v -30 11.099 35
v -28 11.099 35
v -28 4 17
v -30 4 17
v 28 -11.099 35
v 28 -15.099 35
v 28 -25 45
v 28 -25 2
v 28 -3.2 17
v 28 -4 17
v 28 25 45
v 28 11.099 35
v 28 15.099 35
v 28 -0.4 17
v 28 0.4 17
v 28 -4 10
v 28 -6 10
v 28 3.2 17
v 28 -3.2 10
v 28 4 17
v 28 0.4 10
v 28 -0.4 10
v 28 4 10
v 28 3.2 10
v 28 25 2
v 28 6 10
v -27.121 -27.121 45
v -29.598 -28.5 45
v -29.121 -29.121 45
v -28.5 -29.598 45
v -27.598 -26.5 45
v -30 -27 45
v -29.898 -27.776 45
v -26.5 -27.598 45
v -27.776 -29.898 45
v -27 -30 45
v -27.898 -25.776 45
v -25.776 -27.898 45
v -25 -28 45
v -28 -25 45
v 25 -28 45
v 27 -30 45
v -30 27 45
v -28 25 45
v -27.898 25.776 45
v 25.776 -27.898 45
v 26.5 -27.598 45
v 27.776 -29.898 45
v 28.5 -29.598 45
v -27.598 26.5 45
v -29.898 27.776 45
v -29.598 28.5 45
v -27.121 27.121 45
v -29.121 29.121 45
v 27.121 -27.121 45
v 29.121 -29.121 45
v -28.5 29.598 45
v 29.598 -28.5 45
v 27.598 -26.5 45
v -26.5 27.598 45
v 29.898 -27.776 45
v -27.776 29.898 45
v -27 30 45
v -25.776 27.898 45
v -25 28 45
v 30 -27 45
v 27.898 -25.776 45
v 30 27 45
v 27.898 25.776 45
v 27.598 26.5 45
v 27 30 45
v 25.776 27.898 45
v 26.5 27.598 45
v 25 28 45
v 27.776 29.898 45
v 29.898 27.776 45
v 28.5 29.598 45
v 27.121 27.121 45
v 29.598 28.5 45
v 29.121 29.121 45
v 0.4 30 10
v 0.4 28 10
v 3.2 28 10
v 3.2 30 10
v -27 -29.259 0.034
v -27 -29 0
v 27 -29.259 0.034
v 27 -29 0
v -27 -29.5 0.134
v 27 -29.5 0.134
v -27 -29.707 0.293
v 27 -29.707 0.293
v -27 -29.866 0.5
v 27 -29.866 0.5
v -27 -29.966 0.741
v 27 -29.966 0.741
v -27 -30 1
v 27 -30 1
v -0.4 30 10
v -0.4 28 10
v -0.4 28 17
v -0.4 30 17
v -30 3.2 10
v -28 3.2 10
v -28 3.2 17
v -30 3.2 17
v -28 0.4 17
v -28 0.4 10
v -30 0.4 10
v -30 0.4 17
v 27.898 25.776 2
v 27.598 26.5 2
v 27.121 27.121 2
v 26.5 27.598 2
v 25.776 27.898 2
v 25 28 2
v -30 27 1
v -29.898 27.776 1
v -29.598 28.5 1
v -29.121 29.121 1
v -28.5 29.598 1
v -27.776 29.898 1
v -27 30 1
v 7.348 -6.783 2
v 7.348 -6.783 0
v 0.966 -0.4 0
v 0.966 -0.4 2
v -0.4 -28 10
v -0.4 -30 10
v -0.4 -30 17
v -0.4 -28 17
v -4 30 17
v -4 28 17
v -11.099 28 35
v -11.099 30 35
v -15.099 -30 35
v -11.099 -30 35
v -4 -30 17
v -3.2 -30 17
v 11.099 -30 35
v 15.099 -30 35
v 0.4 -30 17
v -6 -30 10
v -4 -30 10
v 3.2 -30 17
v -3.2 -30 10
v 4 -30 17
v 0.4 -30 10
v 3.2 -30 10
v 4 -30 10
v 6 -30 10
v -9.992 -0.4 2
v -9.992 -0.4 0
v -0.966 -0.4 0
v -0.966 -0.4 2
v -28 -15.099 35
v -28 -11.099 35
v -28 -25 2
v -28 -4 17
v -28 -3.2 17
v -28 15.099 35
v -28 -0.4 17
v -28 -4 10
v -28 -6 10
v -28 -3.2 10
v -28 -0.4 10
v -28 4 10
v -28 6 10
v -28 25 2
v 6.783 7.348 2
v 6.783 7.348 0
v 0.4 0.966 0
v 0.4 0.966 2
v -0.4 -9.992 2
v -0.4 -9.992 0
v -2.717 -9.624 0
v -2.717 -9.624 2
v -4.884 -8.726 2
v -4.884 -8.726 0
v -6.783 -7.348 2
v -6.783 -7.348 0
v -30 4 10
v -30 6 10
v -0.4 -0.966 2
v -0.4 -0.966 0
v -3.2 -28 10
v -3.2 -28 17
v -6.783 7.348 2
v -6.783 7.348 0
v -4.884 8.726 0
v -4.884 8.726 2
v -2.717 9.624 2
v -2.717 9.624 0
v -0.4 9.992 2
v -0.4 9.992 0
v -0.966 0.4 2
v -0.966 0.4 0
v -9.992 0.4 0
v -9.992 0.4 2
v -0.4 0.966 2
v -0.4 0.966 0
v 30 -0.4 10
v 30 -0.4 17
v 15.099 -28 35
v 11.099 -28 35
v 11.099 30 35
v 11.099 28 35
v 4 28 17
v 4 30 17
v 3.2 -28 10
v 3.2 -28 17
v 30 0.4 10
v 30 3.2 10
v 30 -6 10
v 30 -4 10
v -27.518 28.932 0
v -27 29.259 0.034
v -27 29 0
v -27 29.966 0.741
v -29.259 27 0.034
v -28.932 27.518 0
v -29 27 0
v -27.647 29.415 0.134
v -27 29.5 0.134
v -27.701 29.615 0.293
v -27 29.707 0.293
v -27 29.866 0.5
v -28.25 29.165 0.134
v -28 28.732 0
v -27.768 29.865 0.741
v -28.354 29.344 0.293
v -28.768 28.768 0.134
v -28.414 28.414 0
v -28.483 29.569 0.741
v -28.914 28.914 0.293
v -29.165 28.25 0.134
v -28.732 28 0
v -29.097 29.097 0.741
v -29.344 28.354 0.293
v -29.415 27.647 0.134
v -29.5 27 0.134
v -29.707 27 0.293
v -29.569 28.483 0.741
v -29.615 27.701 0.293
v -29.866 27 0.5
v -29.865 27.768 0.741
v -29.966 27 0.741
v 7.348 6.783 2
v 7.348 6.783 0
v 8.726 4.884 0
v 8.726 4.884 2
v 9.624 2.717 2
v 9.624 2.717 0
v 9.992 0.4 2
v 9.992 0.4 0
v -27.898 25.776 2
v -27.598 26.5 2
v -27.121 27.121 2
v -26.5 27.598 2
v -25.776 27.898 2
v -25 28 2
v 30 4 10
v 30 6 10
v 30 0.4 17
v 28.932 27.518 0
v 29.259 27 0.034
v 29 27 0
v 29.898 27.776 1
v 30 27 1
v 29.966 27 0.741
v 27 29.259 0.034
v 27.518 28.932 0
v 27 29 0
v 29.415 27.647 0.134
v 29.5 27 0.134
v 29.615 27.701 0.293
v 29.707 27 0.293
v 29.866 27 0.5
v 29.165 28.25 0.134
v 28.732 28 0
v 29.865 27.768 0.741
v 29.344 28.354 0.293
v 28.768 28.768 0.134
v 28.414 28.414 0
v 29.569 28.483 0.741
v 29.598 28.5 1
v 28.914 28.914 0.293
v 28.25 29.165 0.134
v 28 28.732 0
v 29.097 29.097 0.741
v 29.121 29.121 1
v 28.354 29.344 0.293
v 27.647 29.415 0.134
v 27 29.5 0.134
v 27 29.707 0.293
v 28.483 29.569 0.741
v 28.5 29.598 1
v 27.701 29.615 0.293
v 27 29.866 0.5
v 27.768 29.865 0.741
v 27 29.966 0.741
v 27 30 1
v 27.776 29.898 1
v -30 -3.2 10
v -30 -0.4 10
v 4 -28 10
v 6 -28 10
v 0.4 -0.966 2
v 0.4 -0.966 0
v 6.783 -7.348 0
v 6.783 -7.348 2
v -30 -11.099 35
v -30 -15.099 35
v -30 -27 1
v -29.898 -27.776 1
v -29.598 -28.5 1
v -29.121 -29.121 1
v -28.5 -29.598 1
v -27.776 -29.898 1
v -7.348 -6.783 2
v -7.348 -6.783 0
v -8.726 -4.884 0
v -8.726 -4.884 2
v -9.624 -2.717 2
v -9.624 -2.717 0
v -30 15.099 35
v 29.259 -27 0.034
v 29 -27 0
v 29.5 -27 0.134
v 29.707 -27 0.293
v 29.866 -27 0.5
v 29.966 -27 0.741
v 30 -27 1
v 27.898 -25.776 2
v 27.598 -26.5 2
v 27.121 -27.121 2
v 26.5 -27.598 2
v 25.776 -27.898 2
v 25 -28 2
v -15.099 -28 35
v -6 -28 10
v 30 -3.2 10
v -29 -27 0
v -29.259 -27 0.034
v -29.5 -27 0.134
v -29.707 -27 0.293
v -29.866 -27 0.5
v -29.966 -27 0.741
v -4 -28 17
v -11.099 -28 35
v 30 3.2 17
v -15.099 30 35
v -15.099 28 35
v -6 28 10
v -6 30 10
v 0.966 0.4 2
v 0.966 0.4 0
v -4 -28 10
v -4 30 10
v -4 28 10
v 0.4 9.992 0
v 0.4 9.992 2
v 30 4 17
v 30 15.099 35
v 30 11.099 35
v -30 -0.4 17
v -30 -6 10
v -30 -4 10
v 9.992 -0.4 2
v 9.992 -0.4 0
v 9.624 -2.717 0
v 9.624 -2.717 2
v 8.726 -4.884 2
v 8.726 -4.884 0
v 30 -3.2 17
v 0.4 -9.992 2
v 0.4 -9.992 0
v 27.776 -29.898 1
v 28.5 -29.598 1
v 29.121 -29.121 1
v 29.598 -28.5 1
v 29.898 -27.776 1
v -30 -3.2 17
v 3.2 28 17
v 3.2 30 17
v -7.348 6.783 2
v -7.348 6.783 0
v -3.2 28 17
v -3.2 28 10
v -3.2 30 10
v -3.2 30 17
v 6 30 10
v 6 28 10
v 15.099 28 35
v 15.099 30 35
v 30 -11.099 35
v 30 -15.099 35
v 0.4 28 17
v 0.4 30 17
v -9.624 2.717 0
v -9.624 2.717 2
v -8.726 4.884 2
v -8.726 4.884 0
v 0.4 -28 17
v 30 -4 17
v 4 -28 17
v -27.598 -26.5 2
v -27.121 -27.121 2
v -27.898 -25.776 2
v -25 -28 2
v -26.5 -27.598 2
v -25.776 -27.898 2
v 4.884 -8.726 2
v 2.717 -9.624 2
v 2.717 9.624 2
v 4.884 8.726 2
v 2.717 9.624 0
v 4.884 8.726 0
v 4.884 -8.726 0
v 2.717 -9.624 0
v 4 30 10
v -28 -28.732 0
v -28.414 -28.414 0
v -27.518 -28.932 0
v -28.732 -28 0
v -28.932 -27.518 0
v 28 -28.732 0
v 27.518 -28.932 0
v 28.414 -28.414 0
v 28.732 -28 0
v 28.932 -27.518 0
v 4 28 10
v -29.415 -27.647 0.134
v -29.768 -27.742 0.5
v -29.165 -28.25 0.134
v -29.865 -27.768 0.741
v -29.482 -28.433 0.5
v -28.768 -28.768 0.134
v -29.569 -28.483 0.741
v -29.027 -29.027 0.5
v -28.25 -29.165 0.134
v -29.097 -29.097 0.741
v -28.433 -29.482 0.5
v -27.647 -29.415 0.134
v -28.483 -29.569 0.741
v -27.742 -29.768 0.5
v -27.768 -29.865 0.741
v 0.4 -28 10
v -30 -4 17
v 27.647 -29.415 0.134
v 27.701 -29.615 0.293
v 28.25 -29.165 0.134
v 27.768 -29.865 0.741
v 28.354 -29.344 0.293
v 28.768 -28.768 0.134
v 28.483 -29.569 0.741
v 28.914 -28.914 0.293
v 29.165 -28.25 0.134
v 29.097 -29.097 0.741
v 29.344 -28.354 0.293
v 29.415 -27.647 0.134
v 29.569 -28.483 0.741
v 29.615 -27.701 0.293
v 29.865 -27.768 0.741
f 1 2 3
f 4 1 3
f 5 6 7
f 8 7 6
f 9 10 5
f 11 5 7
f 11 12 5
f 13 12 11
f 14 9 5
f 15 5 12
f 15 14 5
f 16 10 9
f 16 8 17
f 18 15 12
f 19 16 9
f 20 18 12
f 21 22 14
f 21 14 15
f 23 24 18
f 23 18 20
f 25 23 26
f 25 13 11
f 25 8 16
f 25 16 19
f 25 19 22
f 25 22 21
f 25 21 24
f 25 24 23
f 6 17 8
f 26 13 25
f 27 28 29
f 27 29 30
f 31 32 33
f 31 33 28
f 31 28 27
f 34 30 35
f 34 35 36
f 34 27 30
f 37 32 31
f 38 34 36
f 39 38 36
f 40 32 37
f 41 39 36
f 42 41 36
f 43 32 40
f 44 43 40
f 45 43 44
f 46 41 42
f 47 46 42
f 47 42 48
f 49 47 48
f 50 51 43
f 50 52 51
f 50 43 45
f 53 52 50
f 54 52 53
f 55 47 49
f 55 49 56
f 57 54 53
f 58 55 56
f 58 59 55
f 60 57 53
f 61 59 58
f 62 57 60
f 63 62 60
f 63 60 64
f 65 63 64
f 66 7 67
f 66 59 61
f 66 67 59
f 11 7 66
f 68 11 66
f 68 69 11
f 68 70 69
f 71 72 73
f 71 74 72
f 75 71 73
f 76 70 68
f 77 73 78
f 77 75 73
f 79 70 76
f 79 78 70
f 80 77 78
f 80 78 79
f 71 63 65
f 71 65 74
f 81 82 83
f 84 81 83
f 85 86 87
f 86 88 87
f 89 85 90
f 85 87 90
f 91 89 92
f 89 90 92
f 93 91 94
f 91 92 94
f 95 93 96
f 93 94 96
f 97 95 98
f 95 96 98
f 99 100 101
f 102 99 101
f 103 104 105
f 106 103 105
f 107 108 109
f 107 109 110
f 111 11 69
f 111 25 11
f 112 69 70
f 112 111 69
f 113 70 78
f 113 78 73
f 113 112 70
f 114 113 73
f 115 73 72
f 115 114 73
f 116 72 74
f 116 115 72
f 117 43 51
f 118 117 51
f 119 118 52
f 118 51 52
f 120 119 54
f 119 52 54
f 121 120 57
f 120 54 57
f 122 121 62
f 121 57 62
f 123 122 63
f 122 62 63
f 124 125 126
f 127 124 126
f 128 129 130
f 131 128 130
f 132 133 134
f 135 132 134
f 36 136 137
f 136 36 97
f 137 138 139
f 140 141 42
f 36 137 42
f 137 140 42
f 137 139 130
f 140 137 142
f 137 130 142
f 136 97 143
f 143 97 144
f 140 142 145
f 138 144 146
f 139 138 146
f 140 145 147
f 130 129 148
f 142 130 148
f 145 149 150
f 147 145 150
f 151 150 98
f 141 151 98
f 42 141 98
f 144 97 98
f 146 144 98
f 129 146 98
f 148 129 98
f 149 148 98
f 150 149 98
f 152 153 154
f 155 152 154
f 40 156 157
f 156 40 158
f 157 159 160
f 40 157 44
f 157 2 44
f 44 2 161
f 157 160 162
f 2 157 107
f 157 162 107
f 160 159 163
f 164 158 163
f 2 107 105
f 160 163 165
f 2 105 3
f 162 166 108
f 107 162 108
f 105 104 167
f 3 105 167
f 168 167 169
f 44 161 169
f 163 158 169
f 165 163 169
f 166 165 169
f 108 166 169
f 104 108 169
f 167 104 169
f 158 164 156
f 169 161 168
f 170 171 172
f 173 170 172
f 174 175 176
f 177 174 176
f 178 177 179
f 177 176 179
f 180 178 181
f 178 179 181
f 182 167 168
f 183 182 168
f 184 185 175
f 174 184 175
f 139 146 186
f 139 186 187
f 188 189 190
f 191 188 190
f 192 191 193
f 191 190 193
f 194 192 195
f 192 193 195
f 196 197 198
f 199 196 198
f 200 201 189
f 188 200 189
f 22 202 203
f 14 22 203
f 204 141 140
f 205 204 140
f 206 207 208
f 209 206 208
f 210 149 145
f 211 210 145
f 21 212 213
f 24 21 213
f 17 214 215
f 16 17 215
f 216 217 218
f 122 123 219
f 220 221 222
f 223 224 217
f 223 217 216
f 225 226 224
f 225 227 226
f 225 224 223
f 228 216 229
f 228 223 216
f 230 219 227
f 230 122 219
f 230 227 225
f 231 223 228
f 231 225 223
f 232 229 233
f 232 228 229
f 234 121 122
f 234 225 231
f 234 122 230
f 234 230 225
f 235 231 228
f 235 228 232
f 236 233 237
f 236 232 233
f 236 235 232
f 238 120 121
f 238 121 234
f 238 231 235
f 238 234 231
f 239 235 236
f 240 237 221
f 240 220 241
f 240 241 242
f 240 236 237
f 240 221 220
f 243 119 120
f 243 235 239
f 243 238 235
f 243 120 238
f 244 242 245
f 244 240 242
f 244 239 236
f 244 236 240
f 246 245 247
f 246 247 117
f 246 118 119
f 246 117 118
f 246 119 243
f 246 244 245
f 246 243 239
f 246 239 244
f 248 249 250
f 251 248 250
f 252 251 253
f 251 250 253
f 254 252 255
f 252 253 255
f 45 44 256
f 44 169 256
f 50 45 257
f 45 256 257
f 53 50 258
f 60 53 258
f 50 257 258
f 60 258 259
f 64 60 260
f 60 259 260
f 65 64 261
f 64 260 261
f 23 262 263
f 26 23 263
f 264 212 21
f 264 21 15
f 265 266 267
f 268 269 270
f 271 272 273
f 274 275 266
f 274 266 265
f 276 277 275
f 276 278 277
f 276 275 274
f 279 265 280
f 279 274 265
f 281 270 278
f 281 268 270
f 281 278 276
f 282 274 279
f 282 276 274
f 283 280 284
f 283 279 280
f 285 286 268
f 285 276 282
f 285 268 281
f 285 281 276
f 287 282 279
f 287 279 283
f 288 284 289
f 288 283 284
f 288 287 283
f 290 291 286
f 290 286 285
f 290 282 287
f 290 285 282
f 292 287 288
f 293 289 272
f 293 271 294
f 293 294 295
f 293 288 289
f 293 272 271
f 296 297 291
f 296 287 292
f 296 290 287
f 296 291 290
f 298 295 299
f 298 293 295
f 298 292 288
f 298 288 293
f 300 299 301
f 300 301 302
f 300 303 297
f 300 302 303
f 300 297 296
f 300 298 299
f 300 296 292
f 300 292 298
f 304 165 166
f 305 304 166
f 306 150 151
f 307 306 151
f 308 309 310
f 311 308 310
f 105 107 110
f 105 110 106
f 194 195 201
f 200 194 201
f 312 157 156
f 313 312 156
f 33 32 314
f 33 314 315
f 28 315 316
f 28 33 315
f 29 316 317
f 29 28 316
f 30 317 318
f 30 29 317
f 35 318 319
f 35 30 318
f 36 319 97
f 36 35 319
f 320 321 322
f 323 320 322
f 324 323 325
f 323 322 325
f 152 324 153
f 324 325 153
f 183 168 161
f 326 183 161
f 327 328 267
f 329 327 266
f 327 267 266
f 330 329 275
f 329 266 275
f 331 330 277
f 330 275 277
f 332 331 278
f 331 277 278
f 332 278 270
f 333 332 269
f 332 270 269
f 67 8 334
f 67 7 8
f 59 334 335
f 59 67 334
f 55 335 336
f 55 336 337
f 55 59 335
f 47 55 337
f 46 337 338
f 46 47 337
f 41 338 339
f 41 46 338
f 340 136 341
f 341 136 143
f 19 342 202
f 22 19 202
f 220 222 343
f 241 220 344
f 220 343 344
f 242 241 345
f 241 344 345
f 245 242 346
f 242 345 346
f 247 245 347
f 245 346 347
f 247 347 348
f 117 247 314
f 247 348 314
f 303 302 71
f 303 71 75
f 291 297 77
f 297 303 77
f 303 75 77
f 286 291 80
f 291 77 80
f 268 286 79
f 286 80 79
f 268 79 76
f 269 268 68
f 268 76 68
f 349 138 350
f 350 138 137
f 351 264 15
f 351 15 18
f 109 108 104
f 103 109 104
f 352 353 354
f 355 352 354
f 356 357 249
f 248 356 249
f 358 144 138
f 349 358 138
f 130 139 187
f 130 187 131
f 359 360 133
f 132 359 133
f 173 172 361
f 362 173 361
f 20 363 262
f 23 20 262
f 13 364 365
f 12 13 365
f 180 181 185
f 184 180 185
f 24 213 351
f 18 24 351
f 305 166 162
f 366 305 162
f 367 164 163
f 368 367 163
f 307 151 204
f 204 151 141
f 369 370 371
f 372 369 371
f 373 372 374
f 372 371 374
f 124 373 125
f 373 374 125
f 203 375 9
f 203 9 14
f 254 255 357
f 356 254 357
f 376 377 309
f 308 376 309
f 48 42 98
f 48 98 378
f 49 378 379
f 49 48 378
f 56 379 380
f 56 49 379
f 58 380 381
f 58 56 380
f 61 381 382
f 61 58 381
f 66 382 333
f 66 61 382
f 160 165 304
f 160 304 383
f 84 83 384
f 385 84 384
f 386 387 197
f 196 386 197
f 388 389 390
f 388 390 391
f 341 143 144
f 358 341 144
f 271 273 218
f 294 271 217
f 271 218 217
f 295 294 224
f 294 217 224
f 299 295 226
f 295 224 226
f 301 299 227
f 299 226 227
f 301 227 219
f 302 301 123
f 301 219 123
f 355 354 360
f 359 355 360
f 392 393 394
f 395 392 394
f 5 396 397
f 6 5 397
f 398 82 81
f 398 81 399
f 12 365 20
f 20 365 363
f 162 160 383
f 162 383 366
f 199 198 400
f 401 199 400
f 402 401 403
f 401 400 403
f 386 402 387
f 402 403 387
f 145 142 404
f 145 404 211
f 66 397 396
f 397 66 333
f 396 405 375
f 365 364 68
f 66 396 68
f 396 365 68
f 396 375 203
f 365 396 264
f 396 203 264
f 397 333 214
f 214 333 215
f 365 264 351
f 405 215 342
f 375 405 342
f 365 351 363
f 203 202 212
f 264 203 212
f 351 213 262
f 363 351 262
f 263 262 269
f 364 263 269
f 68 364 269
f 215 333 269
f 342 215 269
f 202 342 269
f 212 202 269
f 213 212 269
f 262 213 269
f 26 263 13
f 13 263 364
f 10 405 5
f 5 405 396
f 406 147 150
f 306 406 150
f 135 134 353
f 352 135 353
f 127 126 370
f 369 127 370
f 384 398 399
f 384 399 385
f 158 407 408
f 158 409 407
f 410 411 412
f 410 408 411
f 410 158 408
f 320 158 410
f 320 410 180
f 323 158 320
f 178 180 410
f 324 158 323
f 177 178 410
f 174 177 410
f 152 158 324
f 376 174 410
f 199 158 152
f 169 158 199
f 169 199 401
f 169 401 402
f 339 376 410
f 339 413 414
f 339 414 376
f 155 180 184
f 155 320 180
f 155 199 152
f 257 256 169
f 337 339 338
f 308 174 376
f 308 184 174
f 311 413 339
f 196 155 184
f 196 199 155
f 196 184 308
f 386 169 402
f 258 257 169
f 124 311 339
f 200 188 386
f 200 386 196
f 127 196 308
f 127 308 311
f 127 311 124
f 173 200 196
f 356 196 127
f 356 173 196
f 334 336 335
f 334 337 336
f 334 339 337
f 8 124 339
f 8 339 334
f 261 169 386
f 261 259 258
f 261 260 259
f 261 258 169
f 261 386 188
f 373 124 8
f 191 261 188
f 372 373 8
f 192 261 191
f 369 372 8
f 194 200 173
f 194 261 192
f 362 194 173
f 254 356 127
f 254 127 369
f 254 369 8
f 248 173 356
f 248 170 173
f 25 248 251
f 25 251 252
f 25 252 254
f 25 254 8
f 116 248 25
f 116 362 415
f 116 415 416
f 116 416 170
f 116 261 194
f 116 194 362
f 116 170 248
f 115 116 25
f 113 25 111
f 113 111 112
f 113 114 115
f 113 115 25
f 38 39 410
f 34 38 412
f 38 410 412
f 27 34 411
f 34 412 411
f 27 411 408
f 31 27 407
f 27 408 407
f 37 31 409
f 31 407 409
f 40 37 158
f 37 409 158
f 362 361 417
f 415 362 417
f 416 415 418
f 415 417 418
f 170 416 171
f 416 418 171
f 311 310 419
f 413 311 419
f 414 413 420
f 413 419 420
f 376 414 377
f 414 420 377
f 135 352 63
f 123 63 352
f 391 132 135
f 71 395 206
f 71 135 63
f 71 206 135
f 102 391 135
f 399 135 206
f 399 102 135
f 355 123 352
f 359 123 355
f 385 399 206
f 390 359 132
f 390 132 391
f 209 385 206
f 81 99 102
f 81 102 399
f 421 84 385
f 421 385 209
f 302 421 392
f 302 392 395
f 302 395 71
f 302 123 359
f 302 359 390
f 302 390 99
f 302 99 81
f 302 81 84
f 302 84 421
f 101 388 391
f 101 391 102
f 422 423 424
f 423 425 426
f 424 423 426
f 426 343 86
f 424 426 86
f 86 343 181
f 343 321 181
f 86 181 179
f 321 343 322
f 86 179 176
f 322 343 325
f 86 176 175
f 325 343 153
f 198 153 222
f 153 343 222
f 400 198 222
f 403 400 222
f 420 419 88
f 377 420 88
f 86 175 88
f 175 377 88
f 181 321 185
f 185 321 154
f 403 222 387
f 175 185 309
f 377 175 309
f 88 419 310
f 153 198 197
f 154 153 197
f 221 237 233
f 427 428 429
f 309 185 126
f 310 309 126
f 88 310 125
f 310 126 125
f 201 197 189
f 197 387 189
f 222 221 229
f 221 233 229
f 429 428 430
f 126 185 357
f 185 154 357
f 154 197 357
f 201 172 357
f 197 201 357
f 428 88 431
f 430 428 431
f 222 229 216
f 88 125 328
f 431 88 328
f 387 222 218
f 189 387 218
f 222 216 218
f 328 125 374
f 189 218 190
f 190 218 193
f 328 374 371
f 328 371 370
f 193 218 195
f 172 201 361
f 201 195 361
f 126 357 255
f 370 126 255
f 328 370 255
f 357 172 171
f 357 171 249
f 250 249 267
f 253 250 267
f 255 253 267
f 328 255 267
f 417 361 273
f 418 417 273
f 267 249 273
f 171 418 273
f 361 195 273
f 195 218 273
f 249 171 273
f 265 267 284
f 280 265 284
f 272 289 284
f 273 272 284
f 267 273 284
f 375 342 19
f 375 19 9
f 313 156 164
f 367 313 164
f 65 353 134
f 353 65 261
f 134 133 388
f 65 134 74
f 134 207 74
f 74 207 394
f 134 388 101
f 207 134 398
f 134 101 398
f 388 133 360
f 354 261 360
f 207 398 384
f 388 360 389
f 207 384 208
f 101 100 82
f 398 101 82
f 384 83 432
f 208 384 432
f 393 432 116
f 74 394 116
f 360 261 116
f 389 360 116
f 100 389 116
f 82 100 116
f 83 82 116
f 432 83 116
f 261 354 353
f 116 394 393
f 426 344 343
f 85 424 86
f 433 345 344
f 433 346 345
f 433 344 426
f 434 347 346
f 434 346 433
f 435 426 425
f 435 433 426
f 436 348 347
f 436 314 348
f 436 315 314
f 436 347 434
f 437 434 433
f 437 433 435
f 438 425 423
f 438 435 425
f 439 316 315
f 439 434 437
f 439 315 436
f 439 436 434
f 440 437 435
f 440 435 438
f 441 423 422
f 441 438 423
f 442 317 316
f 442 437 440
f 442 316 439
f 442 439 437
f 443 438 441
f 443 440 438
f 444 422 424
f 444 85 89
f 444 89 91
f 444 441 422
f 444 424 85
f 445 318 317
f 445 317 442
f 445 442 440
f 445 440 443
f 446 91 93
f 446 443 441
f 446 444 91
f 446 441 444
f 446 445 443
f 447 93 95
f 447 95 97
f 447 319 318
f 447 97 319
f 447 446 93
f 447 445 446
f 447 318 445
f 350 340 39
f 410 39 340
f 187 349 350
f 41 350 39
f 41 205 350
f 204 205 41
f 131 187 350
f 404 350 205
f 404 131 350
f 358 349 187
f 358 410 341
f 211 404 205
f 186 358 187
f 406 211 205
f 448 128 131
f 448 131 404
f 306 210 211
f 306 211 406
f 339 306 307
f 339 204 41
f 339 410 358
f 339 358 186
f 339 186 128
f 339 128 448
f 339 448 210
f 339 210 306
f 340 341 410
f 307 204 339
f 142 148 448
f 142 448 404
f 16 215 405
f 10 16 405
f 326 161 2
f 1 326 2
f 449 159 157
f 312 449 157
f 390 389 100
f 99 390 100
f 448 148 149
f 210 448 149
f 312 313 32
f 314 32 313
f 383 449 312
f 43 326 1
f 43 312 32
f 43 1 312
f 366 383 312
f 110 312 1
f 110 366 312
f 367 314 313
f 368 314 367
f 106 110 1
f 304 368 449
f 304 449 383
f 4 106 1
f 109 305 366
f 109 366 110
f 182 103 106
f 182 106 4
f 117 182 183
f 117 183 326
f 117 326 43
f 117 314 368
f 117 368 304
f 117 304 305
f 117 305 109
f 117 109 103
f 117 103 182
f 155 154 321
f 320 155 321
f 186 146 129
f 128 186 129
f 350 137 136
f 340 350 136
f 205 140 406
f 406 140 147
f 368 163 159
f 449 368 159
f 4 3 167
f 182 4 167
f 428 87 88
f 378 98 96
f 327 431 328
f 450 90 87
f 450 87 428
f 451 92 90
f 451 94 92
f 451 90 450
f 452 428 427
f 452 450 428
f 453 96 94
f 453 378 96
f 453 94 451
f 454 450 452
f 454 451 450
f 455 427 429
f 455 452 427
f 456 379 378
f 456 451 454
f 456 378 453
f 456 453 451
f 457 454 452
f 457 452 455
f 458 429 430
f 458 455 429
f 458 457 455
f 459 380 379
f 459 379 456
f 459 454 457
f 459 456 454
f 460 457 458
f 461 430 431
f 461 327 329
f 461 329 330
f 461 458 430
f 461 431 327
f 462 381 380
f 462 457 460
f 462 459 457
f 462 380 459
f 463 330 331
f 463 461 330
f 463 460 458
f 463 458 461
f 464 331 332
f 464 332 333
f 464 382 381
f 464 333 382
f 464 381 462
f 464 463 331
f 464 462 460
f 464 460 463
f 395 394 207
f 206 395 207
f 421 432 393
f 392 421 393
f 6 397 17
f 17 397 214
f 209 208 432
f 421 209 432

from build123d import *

# Parameters (mm, degrees)
F0_W     = 60
F0_H     = 60
F1_DEPTH = 45
F2_T     = -2
F3_W     = 2.8
F3_H     = 7
F4_DEPTH = 64.2
F5_W     = 2.8
F5_H     = 7
F6_DEPTH = 63.5
F8_DEPTH = 25
F9_R     = 3
F10_R    = 1


# Not quite as in the source:
# - a feature names something its author has since deleted; it is built from what else it names


with BuildPart() as f1:
    # F0 (on Top) → F1 (new body)
    with BuildSketch(Plane.XY):
        Rectangle(F0_W, F0_H)
    extrude(amount=F1_DEPTH)

    # F2
    f2_openings = [f1.faces().sort_by_distance(p)[0] for p in [
        (0, 0, 45),
    ]]
    offset(amount=F2_T, openings=f2_openings)

    # F3 (on face) → F4 (cut)
    with BuildSketch(Plane.XZ.offset(30)):
        Polygon((-15.0992558567, 35), (-6, 10), (-4, 10), (-4, 17), (-11.0992558567, 35), align=None)
        with Locations((-1.8, 13.5)):
            Rectangle(F3_W, F3_H)
        with Locations((1.8, 13.5)):
            Rectangle(F3_W, F3_H)
        Polygon((4, 17), (4, 10), (6, 10), (15.0992558567, 35), (11.0992558567, 35), align=None)
    extrude(amount=-F4_DEPTH, mode=Mode.SUBTRACT)

    # F5 (on face) → F6 (cut)
    with BuildSketch(Plane.YZ.offset(30)):
        Polygon((-15.0992558567, 35), (-6, 10), (-4, 10), (-4, 17), (-11.0992558567, 35), align=None)
        with Locations((-1.8, 13.5)):
            Rectangle(F5_W, F5_H)
        with Locations((1.8, 13.5)):
            Rectangle(F5_W, F5_H)
        Polygon((4, 17), (4, 10), (6, 10), (15.0992558567, 35), (11.0992558567, 35), align=None)
    extrude(amount=-F6_DEPTH, mode=Mode.SUBTRACT)

    # F7 (on face) → F8 (cut)
    with BuildSketch(Plane(origin=(0, 0, 0), x_dir=(1, 0, 0), z_dir=(0, 0, -1))):
        with BuildLine():
            Line((0.9656854249, 0.4), (9.9919967974, 0.4))
            ThreePointArc((9.9919967974, 0.4), (9.2387953251, 3.8268343237), (7.3482514055, 6.7825659806))
            Line((7.3482514055, 6.7825659806), (0.9656854249, 0.4))
        make_face()
        with BuildLine():
            ThreePointArc((7.3482514055, -6.7825659806), (9.2387953251, -3.8268343237), (9.9919967974, -0.4))
            Line((9.9919967974, -0.4), (0.9656854249, -0.4))
            Line((0.9656854249, -0.4), (7.3482514055, -6.7825659806))
        make_face()
        with BuildLine():
            Line((0.4, 0.9656854249), (6.7825659806, 7.3482514055))
            ThreePointArc((6.7825659806, 7.3482514055), (3.8268343237, 9.2387953251), (0.4, 9.9919967974))
            Line((0.4, 9.9919967974), (0.4, 0.9656854249))
        make_face()
        with BuildLine():
            ThreePointArc((0.4, -9.9919967974), (3.8268343237, -9.2387953251), (6.7825659806, -7.3482514055))
            Line((6.7825659806, -7.3482514055), (0.4, -0.9656854249))
            Line((0.4, -0.9656854249), (0.4, -9.9919967974))
        make_face()
        with BuildLine():
            Line((-6.7825659806, 7.3482514055), (-0.4, 0.9656854249))
            Line((-0.4, 0.9656854249), (-0.4, 9.9919967974))
            ThreePointArc((-0.4, 9.9919967974), (-3.8268343237, 9.2387953251), (-6.7825659806, 7.3482514055))
        make_face()
        with BuildLine():
            Line((-0.4, -9.9919967974), (-0.4, -0.9656854249))
            Line((-0.4, -0.9656854249), (-6.7825659806, -7.3482514055))
            ThreePointArc((-6.7825659806, -7.3482514055), (-3.8268343237, -9.2387953251), (-0.4, -9.9919967974))
        make_face()
        with BuildLine():
            Line((-7.3482514055, -6.7825659806), (-0.9656854249, -0.4))
            Line((-0.9656854249, -0.4), (-9.9919967974, -0.4))
            ThreePointArc((-9.9919967974, -0.4), (-9.2387953251, -3.8268343237), (-7.3482514055, -6.7825659806))
        make_face()
        with BuildLine():
            Line((-9.9919967974, 0.4), (-0.9656854249, 0.4))
            Line((-0.9656854249, 0.4), (-7.3482514055, 6.7825659806))
            ThreePointArc((-7.3482514055, 6.7825659806), (-9.2387953251, 3.8268343237), (-9.9919967974, 0.4))
        make_face()
    extrude(amount=-F8_DEPTH, mode=Mode.SUBTRACT)

    # F9
    f9_edges = [f1.edges().sort_by_distance(p)[0] for p in [
        (-30, -30, 22.5),
        (30, -30, 22.5),
        (30, 30, 22.5),
        (-30, 30, 22.5),
        (-28, -28, 23.5),
        (28, -28, 23.5),
        (28, 28, 23.5),
        (-28, 28, 23.5),
    ]]
    fillet(f9_edges, radius=F9_R)

    # F10
    f10_edges = [f1.edges().sort_by_distance(p)[0] for p in [
        (0, -30, 0),
        (-30, 0, 0),
        (30, 0, 0),
        (0, 30, 0),
        (29.12132, 29.12132, 0),
        (-29.12132, 29.12132, 0),
        (29.12132, -29.12132, 0),
        (-29.12132, -29.12132, 0),
    ]]
    fillet(f10_edges, radius=F10_R)


solid = f1.part
